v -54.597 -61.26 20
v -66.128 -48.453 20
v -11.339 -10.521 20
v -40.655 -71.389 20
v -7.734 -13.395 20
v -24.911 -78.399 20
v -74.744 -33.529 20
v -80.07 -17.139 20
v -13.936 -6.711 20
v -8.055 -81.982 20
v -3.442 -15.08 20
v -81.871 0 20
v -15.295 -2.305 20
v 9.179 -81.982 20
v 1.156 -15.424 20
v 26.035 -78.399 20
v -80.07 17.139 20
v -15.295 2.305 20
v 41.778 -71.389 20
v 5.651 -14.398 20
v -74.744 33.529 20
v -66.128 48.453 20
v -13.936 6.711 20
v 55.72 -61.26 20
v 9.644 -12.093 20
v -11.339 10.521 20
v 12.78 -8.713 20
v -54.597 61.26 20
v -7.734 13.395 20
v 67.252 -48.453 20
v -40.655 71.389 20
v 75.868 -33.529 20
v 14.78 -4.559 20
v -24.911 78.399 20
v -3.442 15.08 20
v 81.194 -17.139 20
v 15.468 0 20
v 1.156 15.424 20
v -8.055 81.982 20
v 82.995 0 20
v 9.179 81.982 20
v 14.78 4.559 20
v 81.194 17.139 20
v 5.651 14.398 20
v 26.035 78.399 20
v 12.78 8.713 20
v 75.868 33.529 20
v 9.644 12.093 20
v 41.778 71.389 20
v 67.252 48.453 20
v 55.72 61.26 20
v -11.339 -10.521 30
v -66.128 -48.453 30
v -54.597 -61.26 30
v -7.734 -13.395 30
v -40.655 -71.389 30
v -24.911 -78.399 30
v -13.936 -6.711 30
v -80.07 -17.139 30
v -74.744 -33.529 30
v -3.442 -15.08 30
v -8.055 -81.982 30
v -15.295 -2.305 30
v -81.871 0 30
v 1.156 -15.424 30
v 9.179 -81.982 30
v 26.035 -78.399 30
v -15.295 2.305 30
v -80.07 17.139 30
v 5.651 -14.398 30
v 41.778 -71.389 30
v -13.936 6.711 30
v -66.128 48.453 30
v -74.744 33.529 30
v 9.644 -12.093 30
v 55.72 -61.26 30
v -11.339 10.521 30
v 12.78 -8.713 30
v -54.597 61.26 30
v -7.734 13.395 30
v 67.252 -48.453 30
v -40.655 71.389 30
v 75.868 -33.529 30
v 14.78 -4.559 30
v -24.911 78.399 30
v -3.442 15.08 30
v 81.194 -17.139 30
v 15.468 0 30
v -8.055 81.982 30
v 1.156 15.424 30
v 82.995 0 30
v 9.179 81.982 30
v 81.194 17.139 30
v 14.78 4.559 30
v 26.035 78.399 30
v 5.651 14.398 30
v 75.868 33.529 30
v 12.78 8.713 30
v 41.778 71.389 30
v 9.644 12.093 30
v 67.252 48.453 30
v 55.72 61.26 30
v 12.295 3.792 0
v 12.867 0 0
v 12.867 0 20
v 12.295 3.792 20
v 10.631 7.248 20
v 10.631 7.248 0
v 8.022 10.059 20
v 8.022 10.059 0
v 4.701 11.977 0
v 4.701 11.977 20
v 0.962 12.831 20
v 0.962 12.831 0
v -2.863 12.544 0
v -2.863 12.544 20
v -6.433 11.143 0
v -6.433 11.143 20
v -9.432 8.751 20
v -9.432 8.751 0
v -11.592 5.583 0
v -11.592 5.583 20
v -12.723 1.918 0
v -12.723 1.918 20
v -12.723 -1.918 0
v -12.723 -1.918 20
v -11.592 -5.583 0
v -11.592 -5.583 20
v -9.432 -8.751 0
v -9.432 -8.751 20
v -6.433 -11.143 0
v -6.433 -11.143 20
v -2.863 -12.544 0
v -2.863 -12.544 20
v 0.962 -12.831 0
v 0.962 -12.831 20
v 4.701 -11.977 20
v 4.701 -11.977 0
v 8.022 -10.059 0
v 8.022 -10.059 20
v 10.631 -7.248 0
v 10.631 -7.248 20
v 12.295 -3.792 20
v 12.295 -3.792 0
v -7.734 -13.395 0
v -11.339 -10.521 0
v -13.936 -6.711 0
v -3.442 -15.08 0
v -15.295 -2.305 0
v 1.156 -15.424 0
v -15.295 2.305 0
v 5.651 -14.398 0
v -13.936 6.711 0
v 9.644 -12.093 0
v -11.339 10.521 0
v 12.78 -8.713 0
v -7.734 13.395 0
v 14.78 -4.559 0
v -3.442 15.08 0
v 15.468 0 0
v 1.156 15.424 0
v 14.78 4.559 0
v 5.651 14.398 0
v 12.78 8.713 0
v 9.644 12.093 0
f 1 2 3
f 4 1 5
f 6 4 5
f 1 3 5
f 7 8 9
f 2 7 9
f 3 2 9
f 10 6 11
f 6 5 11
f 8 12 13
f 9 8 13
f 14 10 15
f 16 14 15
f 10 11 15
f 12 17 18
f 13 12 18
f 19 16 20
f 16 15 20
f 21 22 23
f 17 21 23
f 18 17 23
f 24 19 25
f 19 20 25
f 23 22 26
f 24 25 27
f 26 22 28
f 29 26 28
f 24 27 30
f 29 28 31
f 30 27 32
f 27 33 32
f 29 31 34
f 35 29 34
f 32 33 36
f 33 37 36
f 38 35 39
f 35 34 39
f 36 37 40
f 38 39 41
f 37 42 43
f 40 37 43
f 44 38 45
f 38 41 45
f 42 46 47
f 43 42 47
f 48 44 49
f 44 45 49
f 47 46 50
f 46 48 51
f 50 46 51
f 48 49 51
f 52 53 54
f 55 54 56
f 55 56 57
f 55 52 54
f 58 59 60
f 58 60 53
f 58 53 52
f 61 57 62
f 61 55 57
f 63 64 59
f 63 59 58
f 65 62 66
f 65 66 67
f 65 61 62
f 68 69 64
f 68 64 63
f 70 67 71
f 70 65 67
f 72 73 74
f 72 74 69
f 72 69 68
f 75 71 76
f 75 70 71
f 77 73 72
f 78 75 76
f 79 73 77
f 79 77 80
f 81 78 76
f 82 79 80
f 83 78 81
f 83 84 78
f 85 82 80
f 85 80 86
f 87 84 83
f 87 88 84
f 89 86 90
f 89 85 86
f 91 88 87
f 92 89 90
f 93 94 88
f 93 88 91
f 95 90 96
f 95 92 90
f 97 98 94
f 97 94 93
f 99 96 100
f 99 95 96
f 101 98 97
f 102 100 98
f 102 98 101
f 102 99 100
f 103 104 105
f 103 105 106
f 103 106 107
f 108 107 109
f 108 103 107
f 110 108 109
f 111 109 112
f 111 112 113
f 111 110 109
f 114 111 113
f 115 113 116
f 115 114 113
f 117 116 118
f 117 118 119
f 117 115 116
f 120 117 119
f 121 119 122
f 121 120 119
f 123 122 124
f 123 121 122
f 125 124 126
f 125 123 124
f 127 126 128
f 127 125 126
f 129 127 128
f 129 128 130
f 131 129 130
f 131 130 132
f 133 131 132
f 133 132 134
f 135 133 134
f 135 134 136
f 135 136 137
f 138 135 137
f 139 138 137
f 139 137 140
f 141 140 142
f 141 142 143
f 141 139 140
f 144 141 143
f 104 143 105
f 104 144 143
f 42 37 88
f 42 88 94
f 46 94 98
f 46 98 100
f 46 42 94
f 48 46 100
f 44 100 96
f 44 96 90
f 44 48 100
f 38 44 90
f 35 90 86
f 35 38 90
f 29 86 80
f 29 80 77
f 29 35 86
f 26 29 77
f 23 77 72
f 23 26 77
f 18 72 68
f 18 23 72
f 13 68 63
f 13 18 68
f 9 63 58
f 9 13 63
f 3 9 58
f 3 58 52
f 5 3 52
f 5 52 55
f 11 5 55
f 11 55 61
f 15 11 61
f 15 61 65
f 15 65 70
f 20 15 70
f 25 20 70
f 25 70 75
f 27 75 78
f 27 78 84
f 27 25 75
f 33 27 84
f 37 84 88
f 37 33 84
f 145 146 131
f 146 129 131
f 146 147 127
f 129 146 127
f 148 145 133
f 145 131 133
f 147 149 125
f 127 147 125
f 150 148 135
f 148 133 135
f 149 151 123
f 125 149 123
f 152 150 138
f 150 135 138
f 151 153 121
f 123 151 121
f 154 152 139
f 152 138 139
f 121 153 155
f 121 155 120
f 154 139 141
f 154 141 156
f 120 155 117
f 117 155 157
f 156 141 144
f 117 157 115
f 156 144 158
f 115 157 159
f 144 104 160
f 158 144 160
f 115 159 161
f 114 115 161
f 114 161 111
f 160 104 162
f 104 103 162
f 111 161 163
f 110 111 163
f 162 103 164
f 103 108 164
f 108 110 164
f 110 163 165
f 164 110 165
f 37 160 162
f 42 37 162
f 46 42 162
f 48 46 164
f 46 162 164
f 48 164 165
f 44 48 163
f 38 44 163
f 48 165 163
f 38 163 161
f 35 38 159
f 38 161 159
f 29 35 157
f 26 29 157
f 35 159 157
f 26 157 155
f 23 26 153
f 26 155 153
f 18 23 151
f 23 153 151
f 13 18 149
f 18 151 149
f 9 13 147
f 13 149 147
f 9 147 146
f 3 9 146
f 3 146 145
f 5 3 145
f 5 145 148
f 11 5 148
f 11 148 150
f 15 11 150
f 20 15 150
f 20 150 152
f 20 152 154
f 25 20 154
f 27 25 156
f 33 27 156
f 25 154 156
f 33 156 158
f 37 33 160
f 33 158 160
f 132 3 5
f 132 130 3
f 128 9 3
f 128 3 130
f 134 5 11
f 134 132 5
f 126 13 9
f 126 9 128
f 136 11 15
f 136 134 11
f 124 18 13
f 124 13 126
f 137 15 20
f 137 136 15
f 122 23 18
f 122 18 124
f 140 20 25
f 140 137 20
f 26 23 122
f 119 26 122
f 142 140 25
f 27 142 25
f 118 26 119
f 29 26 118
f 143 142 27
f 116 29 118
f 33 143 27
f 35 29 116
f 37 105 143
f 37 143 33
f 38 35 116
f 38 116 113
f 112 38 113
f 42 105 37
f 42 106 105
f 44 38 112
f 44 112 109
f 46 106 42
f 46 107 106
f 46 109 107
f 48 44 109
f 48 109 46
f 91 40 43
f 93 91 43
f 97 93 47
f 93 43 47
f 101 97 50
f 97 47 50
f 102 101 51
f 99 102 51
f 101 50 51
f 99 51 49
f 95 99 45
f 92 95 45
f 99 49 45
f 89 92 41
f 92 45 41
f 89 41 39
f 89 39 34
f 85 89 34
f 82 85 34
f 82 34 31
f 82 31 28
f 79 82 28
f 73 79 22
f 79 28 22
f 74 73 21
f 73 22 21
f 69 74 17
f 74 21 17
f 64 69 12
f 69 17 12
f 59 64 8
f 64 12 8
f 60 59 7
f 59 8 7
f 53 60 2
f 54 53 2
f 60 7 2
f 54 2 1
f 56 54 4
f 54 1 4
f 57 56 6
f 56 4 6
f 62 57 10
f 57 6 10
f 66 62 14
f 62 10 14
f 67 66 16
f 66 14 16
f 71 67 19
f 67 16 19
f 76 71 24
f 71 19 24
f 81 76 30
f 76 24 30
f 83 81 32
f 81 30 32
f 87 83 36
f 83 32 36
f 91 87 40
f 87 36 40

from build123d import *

# Parameters (mm, degrees)
F0_R     = 15.467669
F0_R_2   = 12.866564
F1_DEPTH = 20
F2_R     = 82.433103
F2_R_2   = 15.467669
F3_DEPTH = 10


with BuildPart() as f1:
    # F0 (on Top) → F1 (new body)
    with BuildSketch(Plane.XY):
        Circle(F0_R)
        Circle(F0_R_2, mode=Mode.SUBTRACT)
    extrude(amount=F1_DEPTH)


with BuildPart() as f3:
    # F2 (on face) → F3 (new body)
    with BuildSketch(Plane.XY.offset(20)):
        with Locations((0.561948, 0)):
            Circle(F2_R)
        Circle(F2_R_2, mode=Mode.SUBTRACT)
    extrude(amount=F3_DEPTH)


solid = Compound([f1.part, f3.part])
